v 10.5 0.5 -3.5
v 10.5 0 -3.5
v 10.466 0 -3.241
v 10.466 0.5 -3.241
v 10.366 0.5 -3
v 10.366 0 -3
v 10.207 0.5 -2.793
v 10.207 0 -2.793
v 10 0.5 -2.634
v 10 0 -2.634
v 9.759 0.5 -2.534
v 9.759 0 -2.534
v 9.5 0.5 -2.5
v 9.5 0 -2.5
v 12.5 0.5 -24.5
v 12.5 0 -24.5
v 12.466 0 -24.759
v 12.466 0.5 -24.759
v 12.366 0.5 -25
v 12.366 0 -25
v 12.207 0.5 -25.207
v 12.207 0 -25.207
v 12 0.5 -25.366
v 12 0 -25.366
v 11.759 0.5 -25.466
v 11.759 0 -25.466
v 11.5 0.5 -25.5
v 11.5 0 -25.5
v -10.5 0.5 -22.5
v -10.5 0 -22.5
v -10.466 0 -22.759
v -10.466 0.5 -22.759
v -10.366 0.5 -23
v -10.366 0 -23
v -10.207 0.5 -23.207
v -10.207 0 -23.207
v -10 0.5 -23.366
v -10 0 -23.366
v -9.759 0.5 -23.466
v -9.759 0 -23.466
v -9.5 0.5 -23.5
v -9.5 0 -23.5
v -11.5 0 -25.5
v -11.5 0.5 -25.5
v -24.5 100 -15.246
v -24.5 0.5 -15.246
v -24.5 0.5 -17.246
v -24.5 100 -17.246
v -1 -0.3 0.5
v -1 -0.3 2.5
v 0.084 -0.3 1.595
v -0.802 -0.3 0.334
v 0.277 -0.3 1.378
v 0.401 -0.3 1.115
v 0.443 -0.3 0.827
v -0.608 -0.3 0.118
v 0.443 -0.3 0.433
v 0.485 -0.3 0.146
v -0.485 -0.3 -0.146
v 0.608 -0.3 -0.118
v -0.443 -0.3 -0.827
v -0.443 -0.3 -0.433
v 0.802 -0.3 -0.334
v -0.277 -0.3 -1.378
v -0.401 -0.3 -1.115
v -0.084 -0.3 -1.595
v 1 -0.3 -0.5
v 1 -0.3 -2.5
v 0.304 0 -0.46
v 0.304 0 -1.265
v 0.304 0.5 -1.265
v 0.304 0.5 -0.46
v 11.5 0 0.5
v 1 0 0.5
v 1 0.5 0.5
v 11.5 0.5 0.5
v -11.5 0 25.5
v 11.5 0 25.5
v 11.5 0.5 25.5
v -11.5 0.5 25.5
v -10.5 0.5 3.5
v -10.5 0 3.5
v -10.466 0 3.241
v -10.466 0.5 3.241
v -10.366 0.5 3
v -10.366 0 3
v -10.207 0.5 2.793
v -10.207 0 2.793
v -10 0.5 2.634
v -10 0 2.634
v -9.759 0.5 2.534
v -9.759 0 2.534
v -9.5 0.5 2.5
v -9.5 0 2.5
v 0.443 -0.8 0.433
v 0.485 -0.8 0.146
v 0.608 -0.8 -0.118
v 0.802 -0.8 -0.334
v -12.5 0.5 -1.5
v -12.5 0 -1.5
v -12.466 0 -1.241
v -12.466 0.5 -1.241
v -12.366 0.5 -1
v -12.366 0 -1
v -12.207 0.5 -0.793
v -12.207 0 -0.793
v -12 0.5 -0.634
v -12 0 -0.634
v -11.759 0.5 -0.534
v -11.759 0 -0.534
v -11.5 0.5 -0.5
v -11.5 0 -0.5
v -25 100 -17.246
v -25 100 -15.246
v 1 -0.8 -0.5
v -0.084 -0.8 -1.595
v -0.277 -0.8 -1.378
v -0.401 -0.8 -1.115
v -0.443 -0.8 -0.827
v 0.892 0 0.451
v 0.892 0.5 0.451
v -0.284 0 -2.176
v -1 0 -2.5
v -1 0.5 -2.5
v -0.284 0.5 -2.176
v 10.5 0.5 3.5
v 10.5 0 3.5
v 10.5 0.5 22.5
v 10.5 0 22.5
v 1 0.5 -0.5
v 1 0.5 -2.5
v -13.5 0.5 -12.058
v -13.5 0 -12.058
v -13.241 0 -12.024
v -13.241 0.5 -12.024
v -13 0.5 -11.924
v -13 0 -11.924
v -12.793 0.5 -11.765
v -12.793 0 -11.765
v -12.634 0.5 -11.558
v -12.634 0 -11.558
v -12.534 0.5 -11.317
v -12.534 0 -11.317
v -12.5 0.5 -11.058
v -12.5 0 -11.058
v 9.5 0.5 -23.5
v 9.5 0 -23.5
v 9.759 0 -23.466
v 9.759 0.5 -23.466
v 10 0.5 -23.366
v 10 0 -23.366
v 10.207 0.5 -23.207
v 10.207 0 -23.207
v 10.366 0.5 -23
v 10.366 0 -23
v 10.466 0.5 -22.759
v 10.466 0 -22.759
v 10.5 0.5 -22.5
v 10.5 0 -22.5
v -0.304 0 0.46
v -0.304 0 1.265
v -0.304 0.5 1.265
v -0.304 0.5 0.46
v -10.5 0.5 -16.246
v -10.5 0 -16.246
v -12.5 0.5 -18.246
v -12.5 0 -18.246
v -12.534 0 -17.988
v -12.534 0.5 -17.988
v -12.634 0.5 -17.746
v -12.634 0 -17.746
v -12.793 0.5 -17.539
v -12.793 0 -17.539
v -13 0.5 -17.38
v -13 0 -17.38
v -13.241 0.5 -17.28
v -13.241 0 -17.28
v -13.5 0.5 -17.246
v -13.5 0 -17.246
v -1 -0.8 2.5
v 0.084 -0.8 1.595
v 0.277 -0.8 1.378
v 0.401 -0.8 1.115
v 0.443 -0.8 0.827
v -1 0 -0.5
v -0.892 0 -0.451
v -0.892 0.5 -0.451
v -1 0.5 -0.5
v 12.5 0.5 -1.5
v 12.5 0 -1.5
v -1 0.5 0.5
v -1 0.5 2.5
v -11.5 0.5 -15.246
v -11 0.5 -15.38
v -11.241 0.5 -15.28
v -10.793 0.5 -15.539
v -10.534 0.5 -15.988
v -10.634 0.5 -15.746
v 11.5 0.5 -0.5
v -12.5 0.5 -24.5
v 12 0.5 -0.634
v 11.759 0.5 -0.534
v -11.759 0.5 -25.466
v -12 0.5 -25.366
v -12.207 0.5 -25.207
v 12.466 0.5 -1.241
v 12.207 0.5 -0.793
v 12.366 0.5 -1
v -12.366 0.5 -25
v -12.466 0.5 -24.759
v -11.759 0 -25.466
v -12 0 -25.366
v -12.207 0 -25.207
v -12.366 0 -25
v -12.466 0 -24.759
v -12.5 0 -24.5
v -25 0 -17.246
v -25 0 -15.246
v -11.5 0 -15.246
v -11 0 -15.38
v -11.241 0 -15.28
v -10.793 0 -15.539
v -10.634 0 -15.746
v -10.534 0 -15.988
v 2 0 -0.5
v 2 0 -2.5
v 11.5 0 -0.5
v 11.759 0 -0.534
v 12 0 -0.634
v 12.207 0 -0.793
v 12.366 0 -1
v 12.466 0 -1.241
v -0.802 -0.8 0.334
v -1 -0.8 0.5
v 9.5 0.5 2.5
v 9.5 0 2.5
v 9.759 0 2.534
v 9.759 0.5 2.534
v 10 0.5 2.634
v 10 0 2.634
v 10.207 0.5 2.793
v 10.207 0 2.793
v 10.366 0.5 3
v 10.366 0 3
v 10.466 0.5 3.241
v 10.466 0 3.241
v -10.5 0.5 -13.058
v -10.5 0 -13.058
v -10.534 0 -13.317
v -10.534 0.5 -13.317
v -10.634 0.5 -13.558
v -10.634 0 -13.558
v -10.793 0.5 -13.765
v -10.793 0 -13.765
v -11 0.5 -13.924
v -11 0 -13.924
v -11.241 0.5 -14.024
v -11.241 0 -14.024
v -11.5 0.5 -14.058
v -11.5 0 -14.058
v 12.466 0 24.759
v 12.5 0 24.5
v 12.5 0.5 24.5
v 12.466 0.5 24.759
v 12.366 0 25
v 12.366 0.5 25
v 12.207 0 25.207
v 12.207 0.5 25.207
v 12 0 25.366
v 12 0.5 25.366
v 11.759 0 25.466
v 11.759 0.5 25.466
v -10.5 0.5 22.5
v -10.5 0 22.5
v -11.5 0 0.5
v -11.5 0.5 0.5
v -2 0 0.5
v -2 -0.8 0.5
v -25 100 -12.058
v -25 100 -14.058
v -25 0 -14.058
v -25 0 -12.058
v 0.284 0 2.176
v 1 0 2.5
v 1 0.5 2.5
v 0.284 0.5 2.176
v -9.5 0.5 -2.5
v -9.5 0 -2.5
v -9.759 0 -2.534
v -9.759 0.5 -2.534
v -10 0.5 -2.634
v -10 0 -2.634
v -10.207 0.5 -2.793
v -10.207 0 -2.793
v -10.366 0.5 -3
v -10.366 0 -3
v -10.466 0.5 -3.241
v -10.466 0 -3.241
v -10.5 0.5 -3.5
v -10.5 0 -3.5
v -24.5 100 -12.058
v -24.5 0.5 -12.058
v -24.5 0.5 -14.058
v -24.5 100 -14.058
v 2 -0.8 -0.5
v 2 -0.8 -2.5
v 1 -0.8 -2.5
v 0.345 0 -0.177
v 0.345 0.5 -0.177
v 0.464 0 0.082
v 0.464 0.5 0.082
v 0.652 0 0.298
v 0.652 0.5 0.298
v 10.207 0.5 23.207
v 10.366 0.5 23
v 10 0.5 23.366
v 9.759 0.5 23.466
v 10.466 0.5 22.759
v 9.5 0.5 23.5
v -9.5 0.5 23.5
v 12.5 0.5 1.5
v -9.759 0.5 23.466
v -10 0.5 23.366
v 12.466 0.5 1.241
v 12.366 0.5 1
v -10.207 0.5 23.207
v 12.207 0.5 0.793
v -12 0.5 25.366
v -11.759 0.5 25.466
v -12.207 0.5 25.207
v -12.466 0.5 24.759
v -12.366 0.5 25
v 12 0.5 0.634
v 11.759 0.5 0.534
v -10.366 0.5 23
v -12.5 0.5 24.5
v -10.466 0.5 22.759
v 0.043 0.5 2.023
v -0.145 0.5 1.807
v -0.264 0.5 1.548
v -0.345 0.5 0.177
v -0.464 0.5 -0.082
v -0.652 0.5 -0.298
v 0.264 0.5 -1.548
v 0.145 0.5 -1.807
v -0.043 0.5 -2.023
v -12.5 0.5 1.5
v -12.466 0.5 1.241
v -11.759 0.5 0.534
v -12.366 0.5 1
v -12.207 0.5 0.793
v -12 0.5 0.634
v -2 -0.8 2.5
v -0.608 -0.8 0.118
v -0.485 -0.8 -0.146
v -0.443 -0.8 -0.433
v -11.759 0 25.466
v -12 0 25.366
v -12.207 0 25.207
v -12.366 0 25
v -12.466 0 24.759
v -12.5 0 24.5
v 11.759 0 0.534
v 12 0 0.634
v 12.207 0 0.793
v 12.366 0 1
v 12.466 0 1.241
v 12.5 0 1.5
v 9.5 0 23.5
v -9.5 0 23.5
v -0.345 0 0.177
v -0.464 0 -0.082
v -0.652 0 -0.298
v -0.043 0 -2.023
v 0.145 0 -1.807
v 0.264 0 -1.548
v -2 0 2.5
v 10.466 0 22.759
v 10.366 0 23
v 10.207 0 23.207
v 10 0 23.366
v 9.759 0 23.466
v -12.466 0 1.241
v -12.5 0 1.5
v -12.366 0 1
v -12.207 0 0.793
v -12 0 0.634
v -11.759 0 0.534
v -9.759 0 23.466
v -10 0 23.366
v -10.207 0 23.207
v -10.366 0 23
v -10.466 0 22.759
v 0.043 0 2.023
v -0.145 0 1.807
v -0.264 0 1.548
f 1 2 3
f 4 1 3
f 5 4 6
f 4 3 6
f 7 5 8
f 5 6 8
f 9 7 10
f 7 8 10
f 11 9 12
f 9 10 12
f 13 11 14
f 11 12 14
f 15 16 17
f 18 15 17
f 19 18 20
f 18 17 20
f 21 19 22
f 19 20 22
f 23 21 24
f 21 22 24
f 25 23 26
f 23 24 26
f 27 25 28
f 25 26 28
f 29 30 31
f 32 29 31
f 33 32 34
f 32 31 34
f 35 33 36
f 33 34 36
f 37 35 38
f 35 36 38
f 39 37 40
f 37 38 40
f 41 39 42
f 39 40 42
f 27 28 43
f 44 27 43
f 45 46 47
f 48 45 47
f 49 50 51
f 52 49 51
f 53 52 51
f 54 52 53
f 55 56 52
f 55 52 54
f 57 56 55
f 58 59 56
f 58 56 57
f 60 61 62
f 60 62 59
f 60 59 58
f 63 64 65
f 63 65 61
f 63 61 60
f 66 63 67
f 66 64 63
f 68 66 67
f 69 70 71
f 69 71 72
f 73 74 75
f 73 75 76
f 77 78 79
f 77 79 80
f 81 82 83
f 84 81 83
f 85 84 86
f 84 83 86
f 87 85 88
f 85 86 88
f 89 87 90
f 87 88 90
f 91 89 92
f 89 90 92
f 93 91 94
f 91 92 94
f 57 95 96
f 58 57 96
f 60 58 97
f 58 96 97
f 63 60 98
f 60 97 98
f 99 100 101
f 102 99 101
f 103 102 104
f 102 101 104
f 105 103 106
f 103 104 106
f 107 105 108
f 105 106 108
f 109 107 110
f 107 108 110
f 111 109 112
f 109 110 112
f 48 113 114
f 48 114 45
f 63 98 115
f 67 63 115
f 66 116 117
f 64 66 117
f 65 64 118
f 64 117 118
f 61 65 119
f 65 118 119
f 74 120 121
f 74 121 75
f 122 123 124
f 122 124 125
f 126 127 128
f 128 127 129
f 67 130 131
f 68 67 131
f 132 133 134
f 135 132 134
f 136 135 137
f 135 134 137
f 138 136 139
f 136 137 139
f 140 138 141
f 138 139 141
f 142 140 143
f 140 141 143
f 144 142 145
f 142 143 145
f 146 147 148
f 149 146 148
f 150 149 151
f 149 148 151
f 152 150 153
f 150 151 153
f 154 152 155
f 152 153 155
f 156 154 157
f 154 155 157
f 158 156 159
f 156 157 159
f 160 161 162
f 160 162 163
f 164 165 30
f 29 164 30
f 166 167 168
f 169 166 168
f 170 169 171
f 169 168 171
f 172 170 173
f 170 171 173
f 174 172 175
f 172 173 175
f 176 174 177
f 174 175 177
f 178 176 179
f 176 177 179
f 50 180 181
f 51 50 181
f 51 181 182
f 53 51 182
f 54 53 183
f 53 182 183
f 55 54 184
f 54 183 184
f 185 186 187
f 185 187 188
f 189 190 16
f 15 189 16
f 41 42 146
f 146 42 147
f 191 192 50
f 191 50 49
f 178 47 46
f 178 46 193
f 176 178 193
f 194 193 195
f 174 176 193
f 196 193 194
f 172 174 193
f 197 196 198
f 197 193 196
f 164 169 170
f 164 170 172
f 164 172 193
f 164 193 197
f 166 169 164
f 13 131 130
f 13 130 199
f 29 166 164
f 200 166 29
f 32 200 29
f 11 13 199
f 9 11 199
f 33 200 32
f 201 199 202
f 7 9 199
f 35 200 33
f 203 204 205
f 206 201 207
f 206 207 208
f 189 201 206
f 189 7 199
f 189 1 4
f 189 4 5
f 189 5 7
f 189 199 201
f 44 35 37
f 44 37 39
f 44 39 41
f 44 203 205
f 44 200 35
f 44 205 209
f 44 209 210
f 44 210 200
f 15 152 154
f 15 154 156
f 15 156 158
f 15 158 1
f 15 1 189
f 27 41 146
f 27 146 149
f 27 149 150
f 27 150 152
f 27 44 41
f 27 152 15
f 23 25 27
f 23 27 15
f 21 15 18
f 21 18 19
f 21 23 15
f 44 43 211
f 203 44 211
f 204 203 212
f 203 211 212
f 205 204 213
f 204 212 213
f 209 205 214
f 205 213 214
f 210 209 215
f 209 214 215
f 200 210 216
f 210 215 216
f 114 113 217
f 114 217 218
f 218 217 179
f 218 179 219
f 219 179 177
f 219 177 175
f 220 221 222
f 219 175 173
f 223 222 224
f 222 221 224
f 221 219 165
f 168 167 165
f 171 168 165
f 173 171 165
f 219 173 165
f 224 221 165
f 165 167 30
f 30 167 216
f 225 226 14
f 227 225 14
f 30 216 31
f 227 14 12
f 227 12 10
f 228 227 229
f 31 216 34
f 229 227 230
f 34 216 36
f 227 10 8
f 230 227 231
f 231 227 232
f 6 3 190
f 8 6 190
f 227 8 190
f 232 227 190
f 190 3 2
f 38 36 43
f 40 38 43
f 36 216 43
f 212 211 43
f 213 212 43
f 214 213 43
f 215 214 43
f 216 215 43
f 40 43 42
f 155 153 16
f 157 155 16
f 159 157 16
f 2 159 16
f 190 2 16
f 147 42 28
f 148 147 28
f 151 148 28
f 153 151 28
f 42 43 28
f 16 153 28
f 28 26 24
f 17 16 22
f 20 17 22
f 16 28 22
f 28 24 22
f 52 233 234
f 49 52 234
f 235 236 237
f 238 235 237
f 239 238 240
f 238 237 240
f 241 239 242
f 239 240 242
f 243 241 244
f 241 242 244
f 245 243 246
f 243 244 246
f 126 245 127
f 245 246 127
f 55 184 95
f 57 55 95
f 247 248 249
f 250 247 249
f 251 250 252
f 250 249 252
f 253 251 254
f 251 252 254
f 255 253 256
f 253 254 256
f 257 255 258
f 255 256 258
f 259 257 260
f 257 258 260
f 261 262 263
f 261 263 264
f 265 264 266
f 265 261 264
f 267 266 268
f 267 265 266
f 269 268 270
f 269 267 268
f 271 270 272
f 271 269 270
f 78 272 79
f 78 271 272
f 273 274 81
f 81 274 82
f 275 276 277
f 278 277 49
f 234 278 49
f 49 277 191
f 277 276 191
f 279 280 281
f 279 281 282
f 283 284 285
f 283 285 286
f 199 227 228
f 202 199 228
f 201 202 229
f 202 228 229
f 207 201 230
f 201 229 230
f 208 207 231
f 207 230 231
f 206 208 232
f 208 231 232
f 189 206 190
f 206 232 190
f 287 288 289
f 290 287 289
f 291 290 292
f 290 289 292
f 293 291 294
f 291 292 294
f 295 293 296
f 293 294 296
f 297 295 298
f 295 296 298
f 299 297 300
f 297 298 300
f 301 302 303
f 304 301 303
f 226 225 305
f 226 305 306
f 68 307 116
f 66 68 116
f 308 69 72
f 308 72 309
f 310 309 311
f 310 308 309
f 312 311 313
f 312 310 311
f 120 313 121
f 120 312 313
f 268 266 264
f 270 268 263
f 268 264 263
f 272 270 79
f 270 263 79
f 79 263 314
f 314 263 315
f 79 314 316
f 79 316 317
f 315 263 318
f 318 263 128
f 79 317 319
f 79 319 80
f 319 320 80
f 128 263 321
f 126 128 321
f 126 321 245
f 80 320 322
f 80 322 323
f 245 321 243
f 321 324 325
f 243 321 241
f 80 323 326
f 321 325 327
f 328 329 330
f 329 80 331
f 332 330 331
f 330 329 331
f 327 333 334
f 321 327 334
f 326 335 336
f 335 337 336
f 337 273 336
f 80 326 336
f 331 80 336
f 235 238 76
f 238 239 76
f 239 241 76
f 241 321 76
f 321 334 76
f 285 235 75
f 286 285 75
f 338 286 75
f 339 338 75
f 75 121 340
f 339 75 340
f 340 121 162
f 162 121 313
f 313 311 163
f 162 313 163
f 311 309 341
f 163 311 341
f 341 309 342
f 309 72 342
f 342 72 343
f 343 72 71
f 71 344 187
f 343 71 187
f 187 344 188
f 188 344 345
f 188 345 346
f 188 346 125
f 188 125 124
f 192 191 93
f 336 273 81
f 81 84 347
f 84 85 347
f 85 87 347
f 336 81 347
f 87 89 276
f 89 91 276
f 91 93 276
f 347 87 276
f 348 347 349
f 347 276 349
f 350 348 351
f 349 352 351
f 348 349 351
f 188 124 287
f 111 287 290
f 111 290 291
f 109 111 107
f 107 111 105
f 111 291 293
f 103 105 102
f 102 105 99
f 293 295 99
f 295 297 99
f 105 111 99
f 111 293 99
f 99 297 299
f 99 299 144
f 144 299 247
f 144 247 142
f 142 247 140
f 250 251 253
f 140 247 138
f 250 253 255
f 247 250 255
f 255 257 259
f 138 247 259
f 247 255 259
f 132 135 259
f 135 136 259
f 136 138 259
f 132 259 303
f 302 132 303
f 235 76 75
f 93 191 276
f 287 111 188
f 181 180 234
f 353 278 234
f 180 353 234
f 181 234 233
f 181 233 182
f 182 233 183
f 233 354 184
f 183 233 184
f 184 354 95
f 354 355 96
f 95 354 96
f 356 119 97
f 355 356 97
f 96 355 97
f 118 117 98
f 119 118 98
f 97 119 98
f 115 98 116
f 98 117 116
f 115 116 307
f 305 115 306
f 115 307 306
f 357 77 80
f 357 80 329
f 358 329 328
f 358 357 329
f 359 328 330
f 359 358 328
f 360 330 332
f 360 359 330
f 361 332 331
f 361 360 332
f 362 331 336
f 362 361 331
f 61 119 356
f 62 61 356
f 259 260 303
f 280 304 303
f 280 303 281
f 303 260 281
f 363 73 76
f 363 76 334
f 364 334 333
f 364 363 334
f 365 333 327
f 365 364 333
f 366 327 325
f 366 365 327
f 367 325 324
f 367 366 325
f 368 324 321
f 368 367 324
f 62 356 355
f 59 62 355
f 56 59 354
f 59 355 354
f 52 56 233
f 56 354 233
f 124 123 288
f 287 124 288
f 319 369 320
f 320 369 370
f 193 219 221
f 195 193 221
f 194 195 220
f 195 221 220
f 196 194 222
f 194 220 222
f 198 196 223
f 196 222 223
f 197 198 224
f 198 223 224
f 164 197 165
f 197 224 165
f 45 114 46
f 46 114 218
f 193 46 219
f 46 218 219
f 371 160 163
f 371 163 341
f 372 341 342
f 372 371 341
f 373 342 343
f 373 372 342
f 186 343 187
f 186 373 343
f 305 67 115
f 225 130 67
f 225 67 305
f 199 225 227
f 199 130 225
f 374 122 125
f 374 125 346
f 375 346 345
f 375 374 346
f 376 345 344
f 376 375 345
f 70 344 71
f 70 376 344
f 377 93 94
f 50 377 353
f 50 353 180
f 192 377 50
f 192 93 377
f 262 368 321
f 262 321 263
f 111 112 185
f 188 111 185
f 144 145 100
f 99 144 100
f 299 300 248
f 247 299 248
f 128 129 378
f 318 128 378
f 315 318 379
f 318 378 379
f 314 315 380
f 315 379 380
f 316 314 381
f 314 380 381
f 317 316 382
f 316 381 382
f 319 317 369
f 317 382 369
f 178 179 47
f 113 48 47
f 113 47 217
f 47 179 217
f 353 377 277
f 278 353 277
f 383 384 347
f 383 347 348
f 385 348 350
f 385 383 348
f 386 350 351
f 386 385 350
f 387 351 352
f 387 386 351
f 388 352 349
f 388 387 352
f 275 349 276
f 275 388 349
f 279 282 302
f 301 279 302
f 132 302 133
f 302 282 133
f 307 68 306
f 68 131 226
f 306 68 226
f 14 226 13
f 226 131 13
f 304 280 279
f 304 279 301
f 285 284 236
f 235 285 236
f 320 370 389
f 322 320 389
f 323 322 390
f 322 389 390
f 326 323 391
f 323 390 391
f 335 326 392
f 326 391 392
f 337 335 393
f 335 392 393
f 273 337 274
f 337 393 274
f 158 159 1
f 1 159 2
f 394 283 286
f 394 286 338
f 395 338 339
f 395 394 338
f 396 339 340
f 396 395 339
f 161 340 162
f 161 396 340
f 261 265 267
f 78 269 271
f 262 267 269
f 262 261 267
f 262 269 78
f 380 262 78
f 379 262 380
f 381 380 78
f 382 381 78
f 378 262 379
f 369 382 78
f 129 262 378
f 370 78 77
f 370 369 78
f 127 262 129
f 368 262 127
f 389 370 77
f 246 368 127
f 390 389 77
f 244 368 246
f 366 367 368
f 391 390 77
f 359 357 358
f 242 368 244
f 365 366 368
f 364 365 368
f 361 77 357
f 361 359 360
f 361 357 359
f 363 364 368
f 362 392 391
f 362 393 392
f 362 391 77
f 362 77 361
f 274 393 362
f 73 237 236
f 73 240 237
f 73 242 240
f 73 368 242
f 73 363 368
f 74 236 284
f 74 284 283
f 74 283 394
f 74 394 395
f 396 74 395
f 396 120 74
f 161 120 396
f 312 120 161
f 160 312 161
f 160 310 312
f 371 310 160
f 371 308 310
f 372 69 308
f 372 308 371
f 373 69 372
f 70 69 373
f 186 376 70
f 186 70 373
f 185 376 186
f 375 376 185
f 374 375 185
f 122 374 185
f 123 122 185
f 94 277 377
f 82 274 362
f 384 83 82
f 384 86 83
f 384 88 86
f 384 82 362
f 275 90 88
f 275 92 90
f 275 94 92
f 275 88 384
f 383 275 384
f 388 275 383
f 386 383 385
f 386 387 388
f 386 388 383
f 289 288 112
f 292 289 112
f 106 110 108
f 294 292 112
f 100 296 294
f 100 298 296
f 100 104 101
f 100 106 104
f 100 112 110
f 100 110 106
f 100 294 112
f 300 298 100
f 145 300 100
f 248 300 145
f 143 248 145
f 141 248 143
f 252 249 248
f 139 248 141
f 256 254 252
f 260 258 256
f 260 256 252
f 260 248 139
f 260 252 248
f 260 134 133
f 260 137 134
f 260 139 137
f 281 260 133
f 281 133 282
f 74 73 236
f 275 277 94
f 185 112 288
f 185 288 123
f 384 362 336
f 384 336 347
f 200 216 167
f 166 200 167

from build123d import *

# Parameters (mm, degrees)
EXTRUDE_1_DEPTH          = 0.5
EXTRUDE_1_2_DEPTH        = 0.5
CUT_EXTRUDE_1_DEPTH      = 10
CUT_EXTRUDE_1_DEPTH_BACK = 10
SKETCH_2_W               = 2
SKETCH_2_H               = 9.01144146
EXTRUDE_2_DEPTH          = 0.5
SKETCH_4_W               = 1
SKETCH_4_H               = 2
EXTRUDE_3_DEPTH          = 0.8
EXTRUDE_4_DEPTH          = 0.5
SKETCH_6_W               = 0.5
SKETCH_6_H               = 2
EXTRUDE_5_DEPTH          = 100


with BuildPart() as part:
    # 草图1 → 凸台-拉伸1 (new body)
    with BuildSketch(Plane(origin=(0, 0, 0), x_dir=(1, 0, 0), z_dir=(0, 1, 0))):
        with BuildLine():
            Line((-9.5, 23.5), (9.5, 23.5))
            ThreePointArc((9.5, 23.5), (10.207106781, 23.207106781), (10.5, 22.5))
            Line((10.5, 22.5), (10.5, 3.5))
            ThreePointArc((10.5, 3.5), (10.207106781, 2.792893219), (9.5, 2.5))
            Line((9.5, 2.5), (-9.5, 2.5))
            ThreePointArc((-9.5, 2.5), (-10.207106781, 2.792893219), (-10.5, 3.5))
            Line((-10.5, 3.5), (-10.5, 13.058292323))
            ThreePointArc((-10.5, 13.058292323), (-10.792893219, 13.765399104), (-11.5, 14.058292323))
            Line((-11.5, 14.058292323), (-25, 14.058292323))
            Line((-25, 14.058292323), (-25, 12.058292323))
            Line((-25, 12.058292323), (-13.5, 12.058292323))
            ThreePointArc((-13.5, 12.058292323), (-12.792893219, 11.765399104), (-12.5, 11.058292323))
            Line((-12.5, 11.058292323), (-12.5, 1.5))
            ThreePointArc((-12.5, 1.5), (-12.207106781, 0.792893219), (-11.5, 0.5))
            Line((-11.5, 0.5), (11.5, 0.5))
            ThreePointArc((11.5, 0.5), (12.207106781, 0.792893219), (12.5, 1.5))
            Line((12.5, 1.5), (12.5, 24.5))
            ThreePointArc((12.5, 24.5), (12.207106781, 25.207106781), (11.5, 25.5))
            Line((11.5, 25.5), (-11.5, 25.5))
            ThreePointArc((-11.5, 25.5), (-12.207106781, 25.207106781), (-12.5, 24.5))
            Line((-12.5, 24.5), (-12.5, 18.246362536))
            ThreePointArc((-12.5, 18.246362536), (-12.792893219, 17.539255755), (-13.5, 17.246362536))
            Line((-13.5, 17.246362536), (-25, 17.246362536))
            Line((-25, 17.246362536), (-25, 15.246362536))
            Line((-25, 15.246362536), (-11.5, 15.246362536))
            ThreePointArc((-11.5, 15.246362536), (-10.792893219, 15.539255755), (-10.5, 16.246362536))
            Line((-10.5, 16.246362536), (-10.5, 22.5))
            ThreePointArc((-10.5, 22.5), (-10.207106781, 23.207106781), (-9.5, 23.5))
        make_face()
    extrude(amount=EXTRUDE_1_DEPTH)


with BuildPart() as body_2:
    # 草图1 → Extrude 1 2 (new body)
    with BuildSketch(Plane(origin=(0, 0, 0), x_dir=(1, 0, 0), z_dir=(0, 1, 0))):
        with BuildLine():
            Line((-11.5, -0.5), (11.5, -0.5))
            ThreePointArc((11.5, -0.5), (12.207106781, -0.792893219), (12.5, -1.5))
            Line((12.5, -1.5), (12.5, -24.5))
            ThreePointArc((12.5, -24.5), (12.207106781, -25.207106781), (11.5, -25.5))
            Line((11.5, -25.5), (-11.5, -25.5))
            ThreePointArc((-11.5, -25.5), (-12.207106781, -25.207106781), (-12.5, -24.5))
            Line((-12.5, -24.5), (-12.5, -1.5))
            ThreePointArc((-12.5, -1.5), (-12.207106781, -0.792893219), (-11.5, -0.5))
        make_face()
        with BuildLine():
            Line((-9.5, -2.5), (9.5, -2.5))
            ThreePointArc((9.5, -2.5), (10.207106781, -2.792893219), (10.5, -3.5))
            Line((10.5, -3.5), (10.5, -22.5))
            ThreePointArc((10.5, -22.5), (10.207106781, -23.207106781), (9.5, -23.5))
            Line((9.5, -23.5), (-9.5, -23.5))
            ThreePointArc((-9.5, -23.5), (-10.207106781, -23.207106781), (-10.5, -22.5))
            Line((-10.5, -22.5), (-10.5, -3.5))
            ThreePointArc((-10.5, -3.5), (-10.207106781, -2.792893219), (-9.5, -2.5))
        make_face(mode=Mode.SUBTRACT)
    extrude(amount=EXTRUDE_1_2_DEPTH)


with BuildPart() as cut_extrude_1_tool:
    # 草图2 → 切除-拉伸1 (new, two sides: drawn at the far end of the back side and taken through both)
    with BuildSketch(Plane(origin=(0, 0, 0), x_dir=(1, 0, 0), z_dir=(0, 1, 0)).offset(-CUT_EXTRUDE_1_DEPTH_BACK)):
        Rectangle(SKETCH_2_W, SKETCH_2_H)
    extrude(amount=CUT_EXTRUDE_1_DEPTH + CUT_EXTRUDE_1_DEPTH_BACK)


with BuildPart() as part_1:
    add(part.part)

    # 切除-拉伸1: cut by cut_extrude_1_tool
    add(cut_extrude_1_tool.part, mode=Mode.SUBTRACT)



with BuildPart() as body_2_1:
    add(body_2.part)

    # 切除-拉伸1: cut by cut_extrude_1_tool
    add(cut_extrude_1_tool.part, mode=Mode.SUBTRACT)


with BuildPart() as part_2:
    add(part_1.part)

    add(body_2_1.part)  # 凸台-拉伸2 merges body 2
    # 草图3 → 凸台-拉伸2 (add)
    with BuildSketch(Plane(origin=(0, 0, 0), x_dir=(1, 0, 0), z_dir=(0, 1, 0))):
        with BuildLine():
            Line((-1, 2.5), (-0.28379779, 2.176260251))
            ThreePointArc((-0.28379779, 2.176260251), (0.144512655, 1.807294997), (0.304305253, 1.265029821))
            Line((0.304305253, 1.265029821), (0.304305253, 0.459864337))
            ThreePointArc((0.304305253, 0.459864337), (0.46409785, -0.082400839), (0.892408295, -0.451366093))
            Line((0.892408295, -0.451366093), (1, -0.5))
            Line((1, -0.5), (1, -2.5))
            Line((1, -2.5), (0.28379779, -2.176260251))
            ThreePointArc((0.28379779, -2.176260251), (-0.144512655, -1.807294997), (-0.304305253, -1.265029821))
            Line((-0.304305253, -1.265029821), (-0.304305253, -0.459864337))
            ThreePointArc((-0.304305253, -0.459864337), (-0.46409785, 0.082400839), (-0.892408295, 0.451366093))
            Line((-0.892408295, 0.451366093), (-1, 0.5))
            Line((-1, 0.5), (-1, 2.5))
        make_face()
    extrude(amount=EXTRUDE_2_DEPTH)

    # 草图4 → 凸台-拉伸3 (add)
    with BuildSketch(Plane(origin=(0, 0, 0), x_dir=(1, 0, 0), z_dir=(0, 1, 0))):
        with Locations((-1.5, -1.5)):
            Rectangle(SKETCH_4_W, SKETCH_4_H)
        with Locations((1.5, 1.5)):
            Rectangle(SKETCH_4_W, SKETCH_4_H)
    extrude(amount=-EXTRUDE_3_DEPTH)

    # 草图5 → 凸台-拉伸4 (add)
    with BuildSketch(Plane(origin=(0, -0.8, 0), x_dir=(1, 0, 0), z_dir=(0, 1, 0))):
        with BuildLine():
            Line((-1, -2.5), (0.08384733, -1.594586619))
            ThreePointArc((0.08384733, -1.594586619), (0.348584902, -1.250746207), (0.442741007, -0.827134547))
            Line((0.442741007, -0.827134547), (0.442741007, -0.433160476))
            ThreePointArc((0.442741007, -0.433160476), (0.536897113, -0.009548815), (0.801634685, 0.334291597))
            Line((0.801634685, 0.334291597), (1, 0.5))
            Line((1, 0.5), (1, 2.5))
            Line((1, 2.5), (-0.08384733, 1.594586619))
            ThreePointArc((-0.08384733, 1.594586619), (-0.348584902, 1.250746207), (-0.442741007, 0.827134547))
            Line((-0.442741007, 0.827134547), (-0.442741007, 0.433160476))
            ThreePointArc((-0.442741007, 0.433160476), (-0.536897113, 0.009548815), (-0.801634685, -0.334291597))
            Line((-0.801634685, -0.334291597), (-1, -0.5))
            Line((-1, -0.5), (-1, -2.5))
        make_face()
    extrude(amount=EXTRUDE_4_DEPTH)

    # 草图6 → 凸台-拉伸5 (add)
    with BuildSketch(Plane(origin=(0, 0, 0), x_dir=(1, 0, 0), z_dir=(0, 1, 0))):
        with Locations((-24.75, 16.246362536)):
            Rectangle(SKETCH_6_W, SKETCH_6_H)
        with Locations((-24.75, 13.058292323)):
            Rectangle(SKETCH_6_W, SKETCH_6_H)
    extrude(amount=EXTRUDE_5_DEPTH)


solid = part_2.part
